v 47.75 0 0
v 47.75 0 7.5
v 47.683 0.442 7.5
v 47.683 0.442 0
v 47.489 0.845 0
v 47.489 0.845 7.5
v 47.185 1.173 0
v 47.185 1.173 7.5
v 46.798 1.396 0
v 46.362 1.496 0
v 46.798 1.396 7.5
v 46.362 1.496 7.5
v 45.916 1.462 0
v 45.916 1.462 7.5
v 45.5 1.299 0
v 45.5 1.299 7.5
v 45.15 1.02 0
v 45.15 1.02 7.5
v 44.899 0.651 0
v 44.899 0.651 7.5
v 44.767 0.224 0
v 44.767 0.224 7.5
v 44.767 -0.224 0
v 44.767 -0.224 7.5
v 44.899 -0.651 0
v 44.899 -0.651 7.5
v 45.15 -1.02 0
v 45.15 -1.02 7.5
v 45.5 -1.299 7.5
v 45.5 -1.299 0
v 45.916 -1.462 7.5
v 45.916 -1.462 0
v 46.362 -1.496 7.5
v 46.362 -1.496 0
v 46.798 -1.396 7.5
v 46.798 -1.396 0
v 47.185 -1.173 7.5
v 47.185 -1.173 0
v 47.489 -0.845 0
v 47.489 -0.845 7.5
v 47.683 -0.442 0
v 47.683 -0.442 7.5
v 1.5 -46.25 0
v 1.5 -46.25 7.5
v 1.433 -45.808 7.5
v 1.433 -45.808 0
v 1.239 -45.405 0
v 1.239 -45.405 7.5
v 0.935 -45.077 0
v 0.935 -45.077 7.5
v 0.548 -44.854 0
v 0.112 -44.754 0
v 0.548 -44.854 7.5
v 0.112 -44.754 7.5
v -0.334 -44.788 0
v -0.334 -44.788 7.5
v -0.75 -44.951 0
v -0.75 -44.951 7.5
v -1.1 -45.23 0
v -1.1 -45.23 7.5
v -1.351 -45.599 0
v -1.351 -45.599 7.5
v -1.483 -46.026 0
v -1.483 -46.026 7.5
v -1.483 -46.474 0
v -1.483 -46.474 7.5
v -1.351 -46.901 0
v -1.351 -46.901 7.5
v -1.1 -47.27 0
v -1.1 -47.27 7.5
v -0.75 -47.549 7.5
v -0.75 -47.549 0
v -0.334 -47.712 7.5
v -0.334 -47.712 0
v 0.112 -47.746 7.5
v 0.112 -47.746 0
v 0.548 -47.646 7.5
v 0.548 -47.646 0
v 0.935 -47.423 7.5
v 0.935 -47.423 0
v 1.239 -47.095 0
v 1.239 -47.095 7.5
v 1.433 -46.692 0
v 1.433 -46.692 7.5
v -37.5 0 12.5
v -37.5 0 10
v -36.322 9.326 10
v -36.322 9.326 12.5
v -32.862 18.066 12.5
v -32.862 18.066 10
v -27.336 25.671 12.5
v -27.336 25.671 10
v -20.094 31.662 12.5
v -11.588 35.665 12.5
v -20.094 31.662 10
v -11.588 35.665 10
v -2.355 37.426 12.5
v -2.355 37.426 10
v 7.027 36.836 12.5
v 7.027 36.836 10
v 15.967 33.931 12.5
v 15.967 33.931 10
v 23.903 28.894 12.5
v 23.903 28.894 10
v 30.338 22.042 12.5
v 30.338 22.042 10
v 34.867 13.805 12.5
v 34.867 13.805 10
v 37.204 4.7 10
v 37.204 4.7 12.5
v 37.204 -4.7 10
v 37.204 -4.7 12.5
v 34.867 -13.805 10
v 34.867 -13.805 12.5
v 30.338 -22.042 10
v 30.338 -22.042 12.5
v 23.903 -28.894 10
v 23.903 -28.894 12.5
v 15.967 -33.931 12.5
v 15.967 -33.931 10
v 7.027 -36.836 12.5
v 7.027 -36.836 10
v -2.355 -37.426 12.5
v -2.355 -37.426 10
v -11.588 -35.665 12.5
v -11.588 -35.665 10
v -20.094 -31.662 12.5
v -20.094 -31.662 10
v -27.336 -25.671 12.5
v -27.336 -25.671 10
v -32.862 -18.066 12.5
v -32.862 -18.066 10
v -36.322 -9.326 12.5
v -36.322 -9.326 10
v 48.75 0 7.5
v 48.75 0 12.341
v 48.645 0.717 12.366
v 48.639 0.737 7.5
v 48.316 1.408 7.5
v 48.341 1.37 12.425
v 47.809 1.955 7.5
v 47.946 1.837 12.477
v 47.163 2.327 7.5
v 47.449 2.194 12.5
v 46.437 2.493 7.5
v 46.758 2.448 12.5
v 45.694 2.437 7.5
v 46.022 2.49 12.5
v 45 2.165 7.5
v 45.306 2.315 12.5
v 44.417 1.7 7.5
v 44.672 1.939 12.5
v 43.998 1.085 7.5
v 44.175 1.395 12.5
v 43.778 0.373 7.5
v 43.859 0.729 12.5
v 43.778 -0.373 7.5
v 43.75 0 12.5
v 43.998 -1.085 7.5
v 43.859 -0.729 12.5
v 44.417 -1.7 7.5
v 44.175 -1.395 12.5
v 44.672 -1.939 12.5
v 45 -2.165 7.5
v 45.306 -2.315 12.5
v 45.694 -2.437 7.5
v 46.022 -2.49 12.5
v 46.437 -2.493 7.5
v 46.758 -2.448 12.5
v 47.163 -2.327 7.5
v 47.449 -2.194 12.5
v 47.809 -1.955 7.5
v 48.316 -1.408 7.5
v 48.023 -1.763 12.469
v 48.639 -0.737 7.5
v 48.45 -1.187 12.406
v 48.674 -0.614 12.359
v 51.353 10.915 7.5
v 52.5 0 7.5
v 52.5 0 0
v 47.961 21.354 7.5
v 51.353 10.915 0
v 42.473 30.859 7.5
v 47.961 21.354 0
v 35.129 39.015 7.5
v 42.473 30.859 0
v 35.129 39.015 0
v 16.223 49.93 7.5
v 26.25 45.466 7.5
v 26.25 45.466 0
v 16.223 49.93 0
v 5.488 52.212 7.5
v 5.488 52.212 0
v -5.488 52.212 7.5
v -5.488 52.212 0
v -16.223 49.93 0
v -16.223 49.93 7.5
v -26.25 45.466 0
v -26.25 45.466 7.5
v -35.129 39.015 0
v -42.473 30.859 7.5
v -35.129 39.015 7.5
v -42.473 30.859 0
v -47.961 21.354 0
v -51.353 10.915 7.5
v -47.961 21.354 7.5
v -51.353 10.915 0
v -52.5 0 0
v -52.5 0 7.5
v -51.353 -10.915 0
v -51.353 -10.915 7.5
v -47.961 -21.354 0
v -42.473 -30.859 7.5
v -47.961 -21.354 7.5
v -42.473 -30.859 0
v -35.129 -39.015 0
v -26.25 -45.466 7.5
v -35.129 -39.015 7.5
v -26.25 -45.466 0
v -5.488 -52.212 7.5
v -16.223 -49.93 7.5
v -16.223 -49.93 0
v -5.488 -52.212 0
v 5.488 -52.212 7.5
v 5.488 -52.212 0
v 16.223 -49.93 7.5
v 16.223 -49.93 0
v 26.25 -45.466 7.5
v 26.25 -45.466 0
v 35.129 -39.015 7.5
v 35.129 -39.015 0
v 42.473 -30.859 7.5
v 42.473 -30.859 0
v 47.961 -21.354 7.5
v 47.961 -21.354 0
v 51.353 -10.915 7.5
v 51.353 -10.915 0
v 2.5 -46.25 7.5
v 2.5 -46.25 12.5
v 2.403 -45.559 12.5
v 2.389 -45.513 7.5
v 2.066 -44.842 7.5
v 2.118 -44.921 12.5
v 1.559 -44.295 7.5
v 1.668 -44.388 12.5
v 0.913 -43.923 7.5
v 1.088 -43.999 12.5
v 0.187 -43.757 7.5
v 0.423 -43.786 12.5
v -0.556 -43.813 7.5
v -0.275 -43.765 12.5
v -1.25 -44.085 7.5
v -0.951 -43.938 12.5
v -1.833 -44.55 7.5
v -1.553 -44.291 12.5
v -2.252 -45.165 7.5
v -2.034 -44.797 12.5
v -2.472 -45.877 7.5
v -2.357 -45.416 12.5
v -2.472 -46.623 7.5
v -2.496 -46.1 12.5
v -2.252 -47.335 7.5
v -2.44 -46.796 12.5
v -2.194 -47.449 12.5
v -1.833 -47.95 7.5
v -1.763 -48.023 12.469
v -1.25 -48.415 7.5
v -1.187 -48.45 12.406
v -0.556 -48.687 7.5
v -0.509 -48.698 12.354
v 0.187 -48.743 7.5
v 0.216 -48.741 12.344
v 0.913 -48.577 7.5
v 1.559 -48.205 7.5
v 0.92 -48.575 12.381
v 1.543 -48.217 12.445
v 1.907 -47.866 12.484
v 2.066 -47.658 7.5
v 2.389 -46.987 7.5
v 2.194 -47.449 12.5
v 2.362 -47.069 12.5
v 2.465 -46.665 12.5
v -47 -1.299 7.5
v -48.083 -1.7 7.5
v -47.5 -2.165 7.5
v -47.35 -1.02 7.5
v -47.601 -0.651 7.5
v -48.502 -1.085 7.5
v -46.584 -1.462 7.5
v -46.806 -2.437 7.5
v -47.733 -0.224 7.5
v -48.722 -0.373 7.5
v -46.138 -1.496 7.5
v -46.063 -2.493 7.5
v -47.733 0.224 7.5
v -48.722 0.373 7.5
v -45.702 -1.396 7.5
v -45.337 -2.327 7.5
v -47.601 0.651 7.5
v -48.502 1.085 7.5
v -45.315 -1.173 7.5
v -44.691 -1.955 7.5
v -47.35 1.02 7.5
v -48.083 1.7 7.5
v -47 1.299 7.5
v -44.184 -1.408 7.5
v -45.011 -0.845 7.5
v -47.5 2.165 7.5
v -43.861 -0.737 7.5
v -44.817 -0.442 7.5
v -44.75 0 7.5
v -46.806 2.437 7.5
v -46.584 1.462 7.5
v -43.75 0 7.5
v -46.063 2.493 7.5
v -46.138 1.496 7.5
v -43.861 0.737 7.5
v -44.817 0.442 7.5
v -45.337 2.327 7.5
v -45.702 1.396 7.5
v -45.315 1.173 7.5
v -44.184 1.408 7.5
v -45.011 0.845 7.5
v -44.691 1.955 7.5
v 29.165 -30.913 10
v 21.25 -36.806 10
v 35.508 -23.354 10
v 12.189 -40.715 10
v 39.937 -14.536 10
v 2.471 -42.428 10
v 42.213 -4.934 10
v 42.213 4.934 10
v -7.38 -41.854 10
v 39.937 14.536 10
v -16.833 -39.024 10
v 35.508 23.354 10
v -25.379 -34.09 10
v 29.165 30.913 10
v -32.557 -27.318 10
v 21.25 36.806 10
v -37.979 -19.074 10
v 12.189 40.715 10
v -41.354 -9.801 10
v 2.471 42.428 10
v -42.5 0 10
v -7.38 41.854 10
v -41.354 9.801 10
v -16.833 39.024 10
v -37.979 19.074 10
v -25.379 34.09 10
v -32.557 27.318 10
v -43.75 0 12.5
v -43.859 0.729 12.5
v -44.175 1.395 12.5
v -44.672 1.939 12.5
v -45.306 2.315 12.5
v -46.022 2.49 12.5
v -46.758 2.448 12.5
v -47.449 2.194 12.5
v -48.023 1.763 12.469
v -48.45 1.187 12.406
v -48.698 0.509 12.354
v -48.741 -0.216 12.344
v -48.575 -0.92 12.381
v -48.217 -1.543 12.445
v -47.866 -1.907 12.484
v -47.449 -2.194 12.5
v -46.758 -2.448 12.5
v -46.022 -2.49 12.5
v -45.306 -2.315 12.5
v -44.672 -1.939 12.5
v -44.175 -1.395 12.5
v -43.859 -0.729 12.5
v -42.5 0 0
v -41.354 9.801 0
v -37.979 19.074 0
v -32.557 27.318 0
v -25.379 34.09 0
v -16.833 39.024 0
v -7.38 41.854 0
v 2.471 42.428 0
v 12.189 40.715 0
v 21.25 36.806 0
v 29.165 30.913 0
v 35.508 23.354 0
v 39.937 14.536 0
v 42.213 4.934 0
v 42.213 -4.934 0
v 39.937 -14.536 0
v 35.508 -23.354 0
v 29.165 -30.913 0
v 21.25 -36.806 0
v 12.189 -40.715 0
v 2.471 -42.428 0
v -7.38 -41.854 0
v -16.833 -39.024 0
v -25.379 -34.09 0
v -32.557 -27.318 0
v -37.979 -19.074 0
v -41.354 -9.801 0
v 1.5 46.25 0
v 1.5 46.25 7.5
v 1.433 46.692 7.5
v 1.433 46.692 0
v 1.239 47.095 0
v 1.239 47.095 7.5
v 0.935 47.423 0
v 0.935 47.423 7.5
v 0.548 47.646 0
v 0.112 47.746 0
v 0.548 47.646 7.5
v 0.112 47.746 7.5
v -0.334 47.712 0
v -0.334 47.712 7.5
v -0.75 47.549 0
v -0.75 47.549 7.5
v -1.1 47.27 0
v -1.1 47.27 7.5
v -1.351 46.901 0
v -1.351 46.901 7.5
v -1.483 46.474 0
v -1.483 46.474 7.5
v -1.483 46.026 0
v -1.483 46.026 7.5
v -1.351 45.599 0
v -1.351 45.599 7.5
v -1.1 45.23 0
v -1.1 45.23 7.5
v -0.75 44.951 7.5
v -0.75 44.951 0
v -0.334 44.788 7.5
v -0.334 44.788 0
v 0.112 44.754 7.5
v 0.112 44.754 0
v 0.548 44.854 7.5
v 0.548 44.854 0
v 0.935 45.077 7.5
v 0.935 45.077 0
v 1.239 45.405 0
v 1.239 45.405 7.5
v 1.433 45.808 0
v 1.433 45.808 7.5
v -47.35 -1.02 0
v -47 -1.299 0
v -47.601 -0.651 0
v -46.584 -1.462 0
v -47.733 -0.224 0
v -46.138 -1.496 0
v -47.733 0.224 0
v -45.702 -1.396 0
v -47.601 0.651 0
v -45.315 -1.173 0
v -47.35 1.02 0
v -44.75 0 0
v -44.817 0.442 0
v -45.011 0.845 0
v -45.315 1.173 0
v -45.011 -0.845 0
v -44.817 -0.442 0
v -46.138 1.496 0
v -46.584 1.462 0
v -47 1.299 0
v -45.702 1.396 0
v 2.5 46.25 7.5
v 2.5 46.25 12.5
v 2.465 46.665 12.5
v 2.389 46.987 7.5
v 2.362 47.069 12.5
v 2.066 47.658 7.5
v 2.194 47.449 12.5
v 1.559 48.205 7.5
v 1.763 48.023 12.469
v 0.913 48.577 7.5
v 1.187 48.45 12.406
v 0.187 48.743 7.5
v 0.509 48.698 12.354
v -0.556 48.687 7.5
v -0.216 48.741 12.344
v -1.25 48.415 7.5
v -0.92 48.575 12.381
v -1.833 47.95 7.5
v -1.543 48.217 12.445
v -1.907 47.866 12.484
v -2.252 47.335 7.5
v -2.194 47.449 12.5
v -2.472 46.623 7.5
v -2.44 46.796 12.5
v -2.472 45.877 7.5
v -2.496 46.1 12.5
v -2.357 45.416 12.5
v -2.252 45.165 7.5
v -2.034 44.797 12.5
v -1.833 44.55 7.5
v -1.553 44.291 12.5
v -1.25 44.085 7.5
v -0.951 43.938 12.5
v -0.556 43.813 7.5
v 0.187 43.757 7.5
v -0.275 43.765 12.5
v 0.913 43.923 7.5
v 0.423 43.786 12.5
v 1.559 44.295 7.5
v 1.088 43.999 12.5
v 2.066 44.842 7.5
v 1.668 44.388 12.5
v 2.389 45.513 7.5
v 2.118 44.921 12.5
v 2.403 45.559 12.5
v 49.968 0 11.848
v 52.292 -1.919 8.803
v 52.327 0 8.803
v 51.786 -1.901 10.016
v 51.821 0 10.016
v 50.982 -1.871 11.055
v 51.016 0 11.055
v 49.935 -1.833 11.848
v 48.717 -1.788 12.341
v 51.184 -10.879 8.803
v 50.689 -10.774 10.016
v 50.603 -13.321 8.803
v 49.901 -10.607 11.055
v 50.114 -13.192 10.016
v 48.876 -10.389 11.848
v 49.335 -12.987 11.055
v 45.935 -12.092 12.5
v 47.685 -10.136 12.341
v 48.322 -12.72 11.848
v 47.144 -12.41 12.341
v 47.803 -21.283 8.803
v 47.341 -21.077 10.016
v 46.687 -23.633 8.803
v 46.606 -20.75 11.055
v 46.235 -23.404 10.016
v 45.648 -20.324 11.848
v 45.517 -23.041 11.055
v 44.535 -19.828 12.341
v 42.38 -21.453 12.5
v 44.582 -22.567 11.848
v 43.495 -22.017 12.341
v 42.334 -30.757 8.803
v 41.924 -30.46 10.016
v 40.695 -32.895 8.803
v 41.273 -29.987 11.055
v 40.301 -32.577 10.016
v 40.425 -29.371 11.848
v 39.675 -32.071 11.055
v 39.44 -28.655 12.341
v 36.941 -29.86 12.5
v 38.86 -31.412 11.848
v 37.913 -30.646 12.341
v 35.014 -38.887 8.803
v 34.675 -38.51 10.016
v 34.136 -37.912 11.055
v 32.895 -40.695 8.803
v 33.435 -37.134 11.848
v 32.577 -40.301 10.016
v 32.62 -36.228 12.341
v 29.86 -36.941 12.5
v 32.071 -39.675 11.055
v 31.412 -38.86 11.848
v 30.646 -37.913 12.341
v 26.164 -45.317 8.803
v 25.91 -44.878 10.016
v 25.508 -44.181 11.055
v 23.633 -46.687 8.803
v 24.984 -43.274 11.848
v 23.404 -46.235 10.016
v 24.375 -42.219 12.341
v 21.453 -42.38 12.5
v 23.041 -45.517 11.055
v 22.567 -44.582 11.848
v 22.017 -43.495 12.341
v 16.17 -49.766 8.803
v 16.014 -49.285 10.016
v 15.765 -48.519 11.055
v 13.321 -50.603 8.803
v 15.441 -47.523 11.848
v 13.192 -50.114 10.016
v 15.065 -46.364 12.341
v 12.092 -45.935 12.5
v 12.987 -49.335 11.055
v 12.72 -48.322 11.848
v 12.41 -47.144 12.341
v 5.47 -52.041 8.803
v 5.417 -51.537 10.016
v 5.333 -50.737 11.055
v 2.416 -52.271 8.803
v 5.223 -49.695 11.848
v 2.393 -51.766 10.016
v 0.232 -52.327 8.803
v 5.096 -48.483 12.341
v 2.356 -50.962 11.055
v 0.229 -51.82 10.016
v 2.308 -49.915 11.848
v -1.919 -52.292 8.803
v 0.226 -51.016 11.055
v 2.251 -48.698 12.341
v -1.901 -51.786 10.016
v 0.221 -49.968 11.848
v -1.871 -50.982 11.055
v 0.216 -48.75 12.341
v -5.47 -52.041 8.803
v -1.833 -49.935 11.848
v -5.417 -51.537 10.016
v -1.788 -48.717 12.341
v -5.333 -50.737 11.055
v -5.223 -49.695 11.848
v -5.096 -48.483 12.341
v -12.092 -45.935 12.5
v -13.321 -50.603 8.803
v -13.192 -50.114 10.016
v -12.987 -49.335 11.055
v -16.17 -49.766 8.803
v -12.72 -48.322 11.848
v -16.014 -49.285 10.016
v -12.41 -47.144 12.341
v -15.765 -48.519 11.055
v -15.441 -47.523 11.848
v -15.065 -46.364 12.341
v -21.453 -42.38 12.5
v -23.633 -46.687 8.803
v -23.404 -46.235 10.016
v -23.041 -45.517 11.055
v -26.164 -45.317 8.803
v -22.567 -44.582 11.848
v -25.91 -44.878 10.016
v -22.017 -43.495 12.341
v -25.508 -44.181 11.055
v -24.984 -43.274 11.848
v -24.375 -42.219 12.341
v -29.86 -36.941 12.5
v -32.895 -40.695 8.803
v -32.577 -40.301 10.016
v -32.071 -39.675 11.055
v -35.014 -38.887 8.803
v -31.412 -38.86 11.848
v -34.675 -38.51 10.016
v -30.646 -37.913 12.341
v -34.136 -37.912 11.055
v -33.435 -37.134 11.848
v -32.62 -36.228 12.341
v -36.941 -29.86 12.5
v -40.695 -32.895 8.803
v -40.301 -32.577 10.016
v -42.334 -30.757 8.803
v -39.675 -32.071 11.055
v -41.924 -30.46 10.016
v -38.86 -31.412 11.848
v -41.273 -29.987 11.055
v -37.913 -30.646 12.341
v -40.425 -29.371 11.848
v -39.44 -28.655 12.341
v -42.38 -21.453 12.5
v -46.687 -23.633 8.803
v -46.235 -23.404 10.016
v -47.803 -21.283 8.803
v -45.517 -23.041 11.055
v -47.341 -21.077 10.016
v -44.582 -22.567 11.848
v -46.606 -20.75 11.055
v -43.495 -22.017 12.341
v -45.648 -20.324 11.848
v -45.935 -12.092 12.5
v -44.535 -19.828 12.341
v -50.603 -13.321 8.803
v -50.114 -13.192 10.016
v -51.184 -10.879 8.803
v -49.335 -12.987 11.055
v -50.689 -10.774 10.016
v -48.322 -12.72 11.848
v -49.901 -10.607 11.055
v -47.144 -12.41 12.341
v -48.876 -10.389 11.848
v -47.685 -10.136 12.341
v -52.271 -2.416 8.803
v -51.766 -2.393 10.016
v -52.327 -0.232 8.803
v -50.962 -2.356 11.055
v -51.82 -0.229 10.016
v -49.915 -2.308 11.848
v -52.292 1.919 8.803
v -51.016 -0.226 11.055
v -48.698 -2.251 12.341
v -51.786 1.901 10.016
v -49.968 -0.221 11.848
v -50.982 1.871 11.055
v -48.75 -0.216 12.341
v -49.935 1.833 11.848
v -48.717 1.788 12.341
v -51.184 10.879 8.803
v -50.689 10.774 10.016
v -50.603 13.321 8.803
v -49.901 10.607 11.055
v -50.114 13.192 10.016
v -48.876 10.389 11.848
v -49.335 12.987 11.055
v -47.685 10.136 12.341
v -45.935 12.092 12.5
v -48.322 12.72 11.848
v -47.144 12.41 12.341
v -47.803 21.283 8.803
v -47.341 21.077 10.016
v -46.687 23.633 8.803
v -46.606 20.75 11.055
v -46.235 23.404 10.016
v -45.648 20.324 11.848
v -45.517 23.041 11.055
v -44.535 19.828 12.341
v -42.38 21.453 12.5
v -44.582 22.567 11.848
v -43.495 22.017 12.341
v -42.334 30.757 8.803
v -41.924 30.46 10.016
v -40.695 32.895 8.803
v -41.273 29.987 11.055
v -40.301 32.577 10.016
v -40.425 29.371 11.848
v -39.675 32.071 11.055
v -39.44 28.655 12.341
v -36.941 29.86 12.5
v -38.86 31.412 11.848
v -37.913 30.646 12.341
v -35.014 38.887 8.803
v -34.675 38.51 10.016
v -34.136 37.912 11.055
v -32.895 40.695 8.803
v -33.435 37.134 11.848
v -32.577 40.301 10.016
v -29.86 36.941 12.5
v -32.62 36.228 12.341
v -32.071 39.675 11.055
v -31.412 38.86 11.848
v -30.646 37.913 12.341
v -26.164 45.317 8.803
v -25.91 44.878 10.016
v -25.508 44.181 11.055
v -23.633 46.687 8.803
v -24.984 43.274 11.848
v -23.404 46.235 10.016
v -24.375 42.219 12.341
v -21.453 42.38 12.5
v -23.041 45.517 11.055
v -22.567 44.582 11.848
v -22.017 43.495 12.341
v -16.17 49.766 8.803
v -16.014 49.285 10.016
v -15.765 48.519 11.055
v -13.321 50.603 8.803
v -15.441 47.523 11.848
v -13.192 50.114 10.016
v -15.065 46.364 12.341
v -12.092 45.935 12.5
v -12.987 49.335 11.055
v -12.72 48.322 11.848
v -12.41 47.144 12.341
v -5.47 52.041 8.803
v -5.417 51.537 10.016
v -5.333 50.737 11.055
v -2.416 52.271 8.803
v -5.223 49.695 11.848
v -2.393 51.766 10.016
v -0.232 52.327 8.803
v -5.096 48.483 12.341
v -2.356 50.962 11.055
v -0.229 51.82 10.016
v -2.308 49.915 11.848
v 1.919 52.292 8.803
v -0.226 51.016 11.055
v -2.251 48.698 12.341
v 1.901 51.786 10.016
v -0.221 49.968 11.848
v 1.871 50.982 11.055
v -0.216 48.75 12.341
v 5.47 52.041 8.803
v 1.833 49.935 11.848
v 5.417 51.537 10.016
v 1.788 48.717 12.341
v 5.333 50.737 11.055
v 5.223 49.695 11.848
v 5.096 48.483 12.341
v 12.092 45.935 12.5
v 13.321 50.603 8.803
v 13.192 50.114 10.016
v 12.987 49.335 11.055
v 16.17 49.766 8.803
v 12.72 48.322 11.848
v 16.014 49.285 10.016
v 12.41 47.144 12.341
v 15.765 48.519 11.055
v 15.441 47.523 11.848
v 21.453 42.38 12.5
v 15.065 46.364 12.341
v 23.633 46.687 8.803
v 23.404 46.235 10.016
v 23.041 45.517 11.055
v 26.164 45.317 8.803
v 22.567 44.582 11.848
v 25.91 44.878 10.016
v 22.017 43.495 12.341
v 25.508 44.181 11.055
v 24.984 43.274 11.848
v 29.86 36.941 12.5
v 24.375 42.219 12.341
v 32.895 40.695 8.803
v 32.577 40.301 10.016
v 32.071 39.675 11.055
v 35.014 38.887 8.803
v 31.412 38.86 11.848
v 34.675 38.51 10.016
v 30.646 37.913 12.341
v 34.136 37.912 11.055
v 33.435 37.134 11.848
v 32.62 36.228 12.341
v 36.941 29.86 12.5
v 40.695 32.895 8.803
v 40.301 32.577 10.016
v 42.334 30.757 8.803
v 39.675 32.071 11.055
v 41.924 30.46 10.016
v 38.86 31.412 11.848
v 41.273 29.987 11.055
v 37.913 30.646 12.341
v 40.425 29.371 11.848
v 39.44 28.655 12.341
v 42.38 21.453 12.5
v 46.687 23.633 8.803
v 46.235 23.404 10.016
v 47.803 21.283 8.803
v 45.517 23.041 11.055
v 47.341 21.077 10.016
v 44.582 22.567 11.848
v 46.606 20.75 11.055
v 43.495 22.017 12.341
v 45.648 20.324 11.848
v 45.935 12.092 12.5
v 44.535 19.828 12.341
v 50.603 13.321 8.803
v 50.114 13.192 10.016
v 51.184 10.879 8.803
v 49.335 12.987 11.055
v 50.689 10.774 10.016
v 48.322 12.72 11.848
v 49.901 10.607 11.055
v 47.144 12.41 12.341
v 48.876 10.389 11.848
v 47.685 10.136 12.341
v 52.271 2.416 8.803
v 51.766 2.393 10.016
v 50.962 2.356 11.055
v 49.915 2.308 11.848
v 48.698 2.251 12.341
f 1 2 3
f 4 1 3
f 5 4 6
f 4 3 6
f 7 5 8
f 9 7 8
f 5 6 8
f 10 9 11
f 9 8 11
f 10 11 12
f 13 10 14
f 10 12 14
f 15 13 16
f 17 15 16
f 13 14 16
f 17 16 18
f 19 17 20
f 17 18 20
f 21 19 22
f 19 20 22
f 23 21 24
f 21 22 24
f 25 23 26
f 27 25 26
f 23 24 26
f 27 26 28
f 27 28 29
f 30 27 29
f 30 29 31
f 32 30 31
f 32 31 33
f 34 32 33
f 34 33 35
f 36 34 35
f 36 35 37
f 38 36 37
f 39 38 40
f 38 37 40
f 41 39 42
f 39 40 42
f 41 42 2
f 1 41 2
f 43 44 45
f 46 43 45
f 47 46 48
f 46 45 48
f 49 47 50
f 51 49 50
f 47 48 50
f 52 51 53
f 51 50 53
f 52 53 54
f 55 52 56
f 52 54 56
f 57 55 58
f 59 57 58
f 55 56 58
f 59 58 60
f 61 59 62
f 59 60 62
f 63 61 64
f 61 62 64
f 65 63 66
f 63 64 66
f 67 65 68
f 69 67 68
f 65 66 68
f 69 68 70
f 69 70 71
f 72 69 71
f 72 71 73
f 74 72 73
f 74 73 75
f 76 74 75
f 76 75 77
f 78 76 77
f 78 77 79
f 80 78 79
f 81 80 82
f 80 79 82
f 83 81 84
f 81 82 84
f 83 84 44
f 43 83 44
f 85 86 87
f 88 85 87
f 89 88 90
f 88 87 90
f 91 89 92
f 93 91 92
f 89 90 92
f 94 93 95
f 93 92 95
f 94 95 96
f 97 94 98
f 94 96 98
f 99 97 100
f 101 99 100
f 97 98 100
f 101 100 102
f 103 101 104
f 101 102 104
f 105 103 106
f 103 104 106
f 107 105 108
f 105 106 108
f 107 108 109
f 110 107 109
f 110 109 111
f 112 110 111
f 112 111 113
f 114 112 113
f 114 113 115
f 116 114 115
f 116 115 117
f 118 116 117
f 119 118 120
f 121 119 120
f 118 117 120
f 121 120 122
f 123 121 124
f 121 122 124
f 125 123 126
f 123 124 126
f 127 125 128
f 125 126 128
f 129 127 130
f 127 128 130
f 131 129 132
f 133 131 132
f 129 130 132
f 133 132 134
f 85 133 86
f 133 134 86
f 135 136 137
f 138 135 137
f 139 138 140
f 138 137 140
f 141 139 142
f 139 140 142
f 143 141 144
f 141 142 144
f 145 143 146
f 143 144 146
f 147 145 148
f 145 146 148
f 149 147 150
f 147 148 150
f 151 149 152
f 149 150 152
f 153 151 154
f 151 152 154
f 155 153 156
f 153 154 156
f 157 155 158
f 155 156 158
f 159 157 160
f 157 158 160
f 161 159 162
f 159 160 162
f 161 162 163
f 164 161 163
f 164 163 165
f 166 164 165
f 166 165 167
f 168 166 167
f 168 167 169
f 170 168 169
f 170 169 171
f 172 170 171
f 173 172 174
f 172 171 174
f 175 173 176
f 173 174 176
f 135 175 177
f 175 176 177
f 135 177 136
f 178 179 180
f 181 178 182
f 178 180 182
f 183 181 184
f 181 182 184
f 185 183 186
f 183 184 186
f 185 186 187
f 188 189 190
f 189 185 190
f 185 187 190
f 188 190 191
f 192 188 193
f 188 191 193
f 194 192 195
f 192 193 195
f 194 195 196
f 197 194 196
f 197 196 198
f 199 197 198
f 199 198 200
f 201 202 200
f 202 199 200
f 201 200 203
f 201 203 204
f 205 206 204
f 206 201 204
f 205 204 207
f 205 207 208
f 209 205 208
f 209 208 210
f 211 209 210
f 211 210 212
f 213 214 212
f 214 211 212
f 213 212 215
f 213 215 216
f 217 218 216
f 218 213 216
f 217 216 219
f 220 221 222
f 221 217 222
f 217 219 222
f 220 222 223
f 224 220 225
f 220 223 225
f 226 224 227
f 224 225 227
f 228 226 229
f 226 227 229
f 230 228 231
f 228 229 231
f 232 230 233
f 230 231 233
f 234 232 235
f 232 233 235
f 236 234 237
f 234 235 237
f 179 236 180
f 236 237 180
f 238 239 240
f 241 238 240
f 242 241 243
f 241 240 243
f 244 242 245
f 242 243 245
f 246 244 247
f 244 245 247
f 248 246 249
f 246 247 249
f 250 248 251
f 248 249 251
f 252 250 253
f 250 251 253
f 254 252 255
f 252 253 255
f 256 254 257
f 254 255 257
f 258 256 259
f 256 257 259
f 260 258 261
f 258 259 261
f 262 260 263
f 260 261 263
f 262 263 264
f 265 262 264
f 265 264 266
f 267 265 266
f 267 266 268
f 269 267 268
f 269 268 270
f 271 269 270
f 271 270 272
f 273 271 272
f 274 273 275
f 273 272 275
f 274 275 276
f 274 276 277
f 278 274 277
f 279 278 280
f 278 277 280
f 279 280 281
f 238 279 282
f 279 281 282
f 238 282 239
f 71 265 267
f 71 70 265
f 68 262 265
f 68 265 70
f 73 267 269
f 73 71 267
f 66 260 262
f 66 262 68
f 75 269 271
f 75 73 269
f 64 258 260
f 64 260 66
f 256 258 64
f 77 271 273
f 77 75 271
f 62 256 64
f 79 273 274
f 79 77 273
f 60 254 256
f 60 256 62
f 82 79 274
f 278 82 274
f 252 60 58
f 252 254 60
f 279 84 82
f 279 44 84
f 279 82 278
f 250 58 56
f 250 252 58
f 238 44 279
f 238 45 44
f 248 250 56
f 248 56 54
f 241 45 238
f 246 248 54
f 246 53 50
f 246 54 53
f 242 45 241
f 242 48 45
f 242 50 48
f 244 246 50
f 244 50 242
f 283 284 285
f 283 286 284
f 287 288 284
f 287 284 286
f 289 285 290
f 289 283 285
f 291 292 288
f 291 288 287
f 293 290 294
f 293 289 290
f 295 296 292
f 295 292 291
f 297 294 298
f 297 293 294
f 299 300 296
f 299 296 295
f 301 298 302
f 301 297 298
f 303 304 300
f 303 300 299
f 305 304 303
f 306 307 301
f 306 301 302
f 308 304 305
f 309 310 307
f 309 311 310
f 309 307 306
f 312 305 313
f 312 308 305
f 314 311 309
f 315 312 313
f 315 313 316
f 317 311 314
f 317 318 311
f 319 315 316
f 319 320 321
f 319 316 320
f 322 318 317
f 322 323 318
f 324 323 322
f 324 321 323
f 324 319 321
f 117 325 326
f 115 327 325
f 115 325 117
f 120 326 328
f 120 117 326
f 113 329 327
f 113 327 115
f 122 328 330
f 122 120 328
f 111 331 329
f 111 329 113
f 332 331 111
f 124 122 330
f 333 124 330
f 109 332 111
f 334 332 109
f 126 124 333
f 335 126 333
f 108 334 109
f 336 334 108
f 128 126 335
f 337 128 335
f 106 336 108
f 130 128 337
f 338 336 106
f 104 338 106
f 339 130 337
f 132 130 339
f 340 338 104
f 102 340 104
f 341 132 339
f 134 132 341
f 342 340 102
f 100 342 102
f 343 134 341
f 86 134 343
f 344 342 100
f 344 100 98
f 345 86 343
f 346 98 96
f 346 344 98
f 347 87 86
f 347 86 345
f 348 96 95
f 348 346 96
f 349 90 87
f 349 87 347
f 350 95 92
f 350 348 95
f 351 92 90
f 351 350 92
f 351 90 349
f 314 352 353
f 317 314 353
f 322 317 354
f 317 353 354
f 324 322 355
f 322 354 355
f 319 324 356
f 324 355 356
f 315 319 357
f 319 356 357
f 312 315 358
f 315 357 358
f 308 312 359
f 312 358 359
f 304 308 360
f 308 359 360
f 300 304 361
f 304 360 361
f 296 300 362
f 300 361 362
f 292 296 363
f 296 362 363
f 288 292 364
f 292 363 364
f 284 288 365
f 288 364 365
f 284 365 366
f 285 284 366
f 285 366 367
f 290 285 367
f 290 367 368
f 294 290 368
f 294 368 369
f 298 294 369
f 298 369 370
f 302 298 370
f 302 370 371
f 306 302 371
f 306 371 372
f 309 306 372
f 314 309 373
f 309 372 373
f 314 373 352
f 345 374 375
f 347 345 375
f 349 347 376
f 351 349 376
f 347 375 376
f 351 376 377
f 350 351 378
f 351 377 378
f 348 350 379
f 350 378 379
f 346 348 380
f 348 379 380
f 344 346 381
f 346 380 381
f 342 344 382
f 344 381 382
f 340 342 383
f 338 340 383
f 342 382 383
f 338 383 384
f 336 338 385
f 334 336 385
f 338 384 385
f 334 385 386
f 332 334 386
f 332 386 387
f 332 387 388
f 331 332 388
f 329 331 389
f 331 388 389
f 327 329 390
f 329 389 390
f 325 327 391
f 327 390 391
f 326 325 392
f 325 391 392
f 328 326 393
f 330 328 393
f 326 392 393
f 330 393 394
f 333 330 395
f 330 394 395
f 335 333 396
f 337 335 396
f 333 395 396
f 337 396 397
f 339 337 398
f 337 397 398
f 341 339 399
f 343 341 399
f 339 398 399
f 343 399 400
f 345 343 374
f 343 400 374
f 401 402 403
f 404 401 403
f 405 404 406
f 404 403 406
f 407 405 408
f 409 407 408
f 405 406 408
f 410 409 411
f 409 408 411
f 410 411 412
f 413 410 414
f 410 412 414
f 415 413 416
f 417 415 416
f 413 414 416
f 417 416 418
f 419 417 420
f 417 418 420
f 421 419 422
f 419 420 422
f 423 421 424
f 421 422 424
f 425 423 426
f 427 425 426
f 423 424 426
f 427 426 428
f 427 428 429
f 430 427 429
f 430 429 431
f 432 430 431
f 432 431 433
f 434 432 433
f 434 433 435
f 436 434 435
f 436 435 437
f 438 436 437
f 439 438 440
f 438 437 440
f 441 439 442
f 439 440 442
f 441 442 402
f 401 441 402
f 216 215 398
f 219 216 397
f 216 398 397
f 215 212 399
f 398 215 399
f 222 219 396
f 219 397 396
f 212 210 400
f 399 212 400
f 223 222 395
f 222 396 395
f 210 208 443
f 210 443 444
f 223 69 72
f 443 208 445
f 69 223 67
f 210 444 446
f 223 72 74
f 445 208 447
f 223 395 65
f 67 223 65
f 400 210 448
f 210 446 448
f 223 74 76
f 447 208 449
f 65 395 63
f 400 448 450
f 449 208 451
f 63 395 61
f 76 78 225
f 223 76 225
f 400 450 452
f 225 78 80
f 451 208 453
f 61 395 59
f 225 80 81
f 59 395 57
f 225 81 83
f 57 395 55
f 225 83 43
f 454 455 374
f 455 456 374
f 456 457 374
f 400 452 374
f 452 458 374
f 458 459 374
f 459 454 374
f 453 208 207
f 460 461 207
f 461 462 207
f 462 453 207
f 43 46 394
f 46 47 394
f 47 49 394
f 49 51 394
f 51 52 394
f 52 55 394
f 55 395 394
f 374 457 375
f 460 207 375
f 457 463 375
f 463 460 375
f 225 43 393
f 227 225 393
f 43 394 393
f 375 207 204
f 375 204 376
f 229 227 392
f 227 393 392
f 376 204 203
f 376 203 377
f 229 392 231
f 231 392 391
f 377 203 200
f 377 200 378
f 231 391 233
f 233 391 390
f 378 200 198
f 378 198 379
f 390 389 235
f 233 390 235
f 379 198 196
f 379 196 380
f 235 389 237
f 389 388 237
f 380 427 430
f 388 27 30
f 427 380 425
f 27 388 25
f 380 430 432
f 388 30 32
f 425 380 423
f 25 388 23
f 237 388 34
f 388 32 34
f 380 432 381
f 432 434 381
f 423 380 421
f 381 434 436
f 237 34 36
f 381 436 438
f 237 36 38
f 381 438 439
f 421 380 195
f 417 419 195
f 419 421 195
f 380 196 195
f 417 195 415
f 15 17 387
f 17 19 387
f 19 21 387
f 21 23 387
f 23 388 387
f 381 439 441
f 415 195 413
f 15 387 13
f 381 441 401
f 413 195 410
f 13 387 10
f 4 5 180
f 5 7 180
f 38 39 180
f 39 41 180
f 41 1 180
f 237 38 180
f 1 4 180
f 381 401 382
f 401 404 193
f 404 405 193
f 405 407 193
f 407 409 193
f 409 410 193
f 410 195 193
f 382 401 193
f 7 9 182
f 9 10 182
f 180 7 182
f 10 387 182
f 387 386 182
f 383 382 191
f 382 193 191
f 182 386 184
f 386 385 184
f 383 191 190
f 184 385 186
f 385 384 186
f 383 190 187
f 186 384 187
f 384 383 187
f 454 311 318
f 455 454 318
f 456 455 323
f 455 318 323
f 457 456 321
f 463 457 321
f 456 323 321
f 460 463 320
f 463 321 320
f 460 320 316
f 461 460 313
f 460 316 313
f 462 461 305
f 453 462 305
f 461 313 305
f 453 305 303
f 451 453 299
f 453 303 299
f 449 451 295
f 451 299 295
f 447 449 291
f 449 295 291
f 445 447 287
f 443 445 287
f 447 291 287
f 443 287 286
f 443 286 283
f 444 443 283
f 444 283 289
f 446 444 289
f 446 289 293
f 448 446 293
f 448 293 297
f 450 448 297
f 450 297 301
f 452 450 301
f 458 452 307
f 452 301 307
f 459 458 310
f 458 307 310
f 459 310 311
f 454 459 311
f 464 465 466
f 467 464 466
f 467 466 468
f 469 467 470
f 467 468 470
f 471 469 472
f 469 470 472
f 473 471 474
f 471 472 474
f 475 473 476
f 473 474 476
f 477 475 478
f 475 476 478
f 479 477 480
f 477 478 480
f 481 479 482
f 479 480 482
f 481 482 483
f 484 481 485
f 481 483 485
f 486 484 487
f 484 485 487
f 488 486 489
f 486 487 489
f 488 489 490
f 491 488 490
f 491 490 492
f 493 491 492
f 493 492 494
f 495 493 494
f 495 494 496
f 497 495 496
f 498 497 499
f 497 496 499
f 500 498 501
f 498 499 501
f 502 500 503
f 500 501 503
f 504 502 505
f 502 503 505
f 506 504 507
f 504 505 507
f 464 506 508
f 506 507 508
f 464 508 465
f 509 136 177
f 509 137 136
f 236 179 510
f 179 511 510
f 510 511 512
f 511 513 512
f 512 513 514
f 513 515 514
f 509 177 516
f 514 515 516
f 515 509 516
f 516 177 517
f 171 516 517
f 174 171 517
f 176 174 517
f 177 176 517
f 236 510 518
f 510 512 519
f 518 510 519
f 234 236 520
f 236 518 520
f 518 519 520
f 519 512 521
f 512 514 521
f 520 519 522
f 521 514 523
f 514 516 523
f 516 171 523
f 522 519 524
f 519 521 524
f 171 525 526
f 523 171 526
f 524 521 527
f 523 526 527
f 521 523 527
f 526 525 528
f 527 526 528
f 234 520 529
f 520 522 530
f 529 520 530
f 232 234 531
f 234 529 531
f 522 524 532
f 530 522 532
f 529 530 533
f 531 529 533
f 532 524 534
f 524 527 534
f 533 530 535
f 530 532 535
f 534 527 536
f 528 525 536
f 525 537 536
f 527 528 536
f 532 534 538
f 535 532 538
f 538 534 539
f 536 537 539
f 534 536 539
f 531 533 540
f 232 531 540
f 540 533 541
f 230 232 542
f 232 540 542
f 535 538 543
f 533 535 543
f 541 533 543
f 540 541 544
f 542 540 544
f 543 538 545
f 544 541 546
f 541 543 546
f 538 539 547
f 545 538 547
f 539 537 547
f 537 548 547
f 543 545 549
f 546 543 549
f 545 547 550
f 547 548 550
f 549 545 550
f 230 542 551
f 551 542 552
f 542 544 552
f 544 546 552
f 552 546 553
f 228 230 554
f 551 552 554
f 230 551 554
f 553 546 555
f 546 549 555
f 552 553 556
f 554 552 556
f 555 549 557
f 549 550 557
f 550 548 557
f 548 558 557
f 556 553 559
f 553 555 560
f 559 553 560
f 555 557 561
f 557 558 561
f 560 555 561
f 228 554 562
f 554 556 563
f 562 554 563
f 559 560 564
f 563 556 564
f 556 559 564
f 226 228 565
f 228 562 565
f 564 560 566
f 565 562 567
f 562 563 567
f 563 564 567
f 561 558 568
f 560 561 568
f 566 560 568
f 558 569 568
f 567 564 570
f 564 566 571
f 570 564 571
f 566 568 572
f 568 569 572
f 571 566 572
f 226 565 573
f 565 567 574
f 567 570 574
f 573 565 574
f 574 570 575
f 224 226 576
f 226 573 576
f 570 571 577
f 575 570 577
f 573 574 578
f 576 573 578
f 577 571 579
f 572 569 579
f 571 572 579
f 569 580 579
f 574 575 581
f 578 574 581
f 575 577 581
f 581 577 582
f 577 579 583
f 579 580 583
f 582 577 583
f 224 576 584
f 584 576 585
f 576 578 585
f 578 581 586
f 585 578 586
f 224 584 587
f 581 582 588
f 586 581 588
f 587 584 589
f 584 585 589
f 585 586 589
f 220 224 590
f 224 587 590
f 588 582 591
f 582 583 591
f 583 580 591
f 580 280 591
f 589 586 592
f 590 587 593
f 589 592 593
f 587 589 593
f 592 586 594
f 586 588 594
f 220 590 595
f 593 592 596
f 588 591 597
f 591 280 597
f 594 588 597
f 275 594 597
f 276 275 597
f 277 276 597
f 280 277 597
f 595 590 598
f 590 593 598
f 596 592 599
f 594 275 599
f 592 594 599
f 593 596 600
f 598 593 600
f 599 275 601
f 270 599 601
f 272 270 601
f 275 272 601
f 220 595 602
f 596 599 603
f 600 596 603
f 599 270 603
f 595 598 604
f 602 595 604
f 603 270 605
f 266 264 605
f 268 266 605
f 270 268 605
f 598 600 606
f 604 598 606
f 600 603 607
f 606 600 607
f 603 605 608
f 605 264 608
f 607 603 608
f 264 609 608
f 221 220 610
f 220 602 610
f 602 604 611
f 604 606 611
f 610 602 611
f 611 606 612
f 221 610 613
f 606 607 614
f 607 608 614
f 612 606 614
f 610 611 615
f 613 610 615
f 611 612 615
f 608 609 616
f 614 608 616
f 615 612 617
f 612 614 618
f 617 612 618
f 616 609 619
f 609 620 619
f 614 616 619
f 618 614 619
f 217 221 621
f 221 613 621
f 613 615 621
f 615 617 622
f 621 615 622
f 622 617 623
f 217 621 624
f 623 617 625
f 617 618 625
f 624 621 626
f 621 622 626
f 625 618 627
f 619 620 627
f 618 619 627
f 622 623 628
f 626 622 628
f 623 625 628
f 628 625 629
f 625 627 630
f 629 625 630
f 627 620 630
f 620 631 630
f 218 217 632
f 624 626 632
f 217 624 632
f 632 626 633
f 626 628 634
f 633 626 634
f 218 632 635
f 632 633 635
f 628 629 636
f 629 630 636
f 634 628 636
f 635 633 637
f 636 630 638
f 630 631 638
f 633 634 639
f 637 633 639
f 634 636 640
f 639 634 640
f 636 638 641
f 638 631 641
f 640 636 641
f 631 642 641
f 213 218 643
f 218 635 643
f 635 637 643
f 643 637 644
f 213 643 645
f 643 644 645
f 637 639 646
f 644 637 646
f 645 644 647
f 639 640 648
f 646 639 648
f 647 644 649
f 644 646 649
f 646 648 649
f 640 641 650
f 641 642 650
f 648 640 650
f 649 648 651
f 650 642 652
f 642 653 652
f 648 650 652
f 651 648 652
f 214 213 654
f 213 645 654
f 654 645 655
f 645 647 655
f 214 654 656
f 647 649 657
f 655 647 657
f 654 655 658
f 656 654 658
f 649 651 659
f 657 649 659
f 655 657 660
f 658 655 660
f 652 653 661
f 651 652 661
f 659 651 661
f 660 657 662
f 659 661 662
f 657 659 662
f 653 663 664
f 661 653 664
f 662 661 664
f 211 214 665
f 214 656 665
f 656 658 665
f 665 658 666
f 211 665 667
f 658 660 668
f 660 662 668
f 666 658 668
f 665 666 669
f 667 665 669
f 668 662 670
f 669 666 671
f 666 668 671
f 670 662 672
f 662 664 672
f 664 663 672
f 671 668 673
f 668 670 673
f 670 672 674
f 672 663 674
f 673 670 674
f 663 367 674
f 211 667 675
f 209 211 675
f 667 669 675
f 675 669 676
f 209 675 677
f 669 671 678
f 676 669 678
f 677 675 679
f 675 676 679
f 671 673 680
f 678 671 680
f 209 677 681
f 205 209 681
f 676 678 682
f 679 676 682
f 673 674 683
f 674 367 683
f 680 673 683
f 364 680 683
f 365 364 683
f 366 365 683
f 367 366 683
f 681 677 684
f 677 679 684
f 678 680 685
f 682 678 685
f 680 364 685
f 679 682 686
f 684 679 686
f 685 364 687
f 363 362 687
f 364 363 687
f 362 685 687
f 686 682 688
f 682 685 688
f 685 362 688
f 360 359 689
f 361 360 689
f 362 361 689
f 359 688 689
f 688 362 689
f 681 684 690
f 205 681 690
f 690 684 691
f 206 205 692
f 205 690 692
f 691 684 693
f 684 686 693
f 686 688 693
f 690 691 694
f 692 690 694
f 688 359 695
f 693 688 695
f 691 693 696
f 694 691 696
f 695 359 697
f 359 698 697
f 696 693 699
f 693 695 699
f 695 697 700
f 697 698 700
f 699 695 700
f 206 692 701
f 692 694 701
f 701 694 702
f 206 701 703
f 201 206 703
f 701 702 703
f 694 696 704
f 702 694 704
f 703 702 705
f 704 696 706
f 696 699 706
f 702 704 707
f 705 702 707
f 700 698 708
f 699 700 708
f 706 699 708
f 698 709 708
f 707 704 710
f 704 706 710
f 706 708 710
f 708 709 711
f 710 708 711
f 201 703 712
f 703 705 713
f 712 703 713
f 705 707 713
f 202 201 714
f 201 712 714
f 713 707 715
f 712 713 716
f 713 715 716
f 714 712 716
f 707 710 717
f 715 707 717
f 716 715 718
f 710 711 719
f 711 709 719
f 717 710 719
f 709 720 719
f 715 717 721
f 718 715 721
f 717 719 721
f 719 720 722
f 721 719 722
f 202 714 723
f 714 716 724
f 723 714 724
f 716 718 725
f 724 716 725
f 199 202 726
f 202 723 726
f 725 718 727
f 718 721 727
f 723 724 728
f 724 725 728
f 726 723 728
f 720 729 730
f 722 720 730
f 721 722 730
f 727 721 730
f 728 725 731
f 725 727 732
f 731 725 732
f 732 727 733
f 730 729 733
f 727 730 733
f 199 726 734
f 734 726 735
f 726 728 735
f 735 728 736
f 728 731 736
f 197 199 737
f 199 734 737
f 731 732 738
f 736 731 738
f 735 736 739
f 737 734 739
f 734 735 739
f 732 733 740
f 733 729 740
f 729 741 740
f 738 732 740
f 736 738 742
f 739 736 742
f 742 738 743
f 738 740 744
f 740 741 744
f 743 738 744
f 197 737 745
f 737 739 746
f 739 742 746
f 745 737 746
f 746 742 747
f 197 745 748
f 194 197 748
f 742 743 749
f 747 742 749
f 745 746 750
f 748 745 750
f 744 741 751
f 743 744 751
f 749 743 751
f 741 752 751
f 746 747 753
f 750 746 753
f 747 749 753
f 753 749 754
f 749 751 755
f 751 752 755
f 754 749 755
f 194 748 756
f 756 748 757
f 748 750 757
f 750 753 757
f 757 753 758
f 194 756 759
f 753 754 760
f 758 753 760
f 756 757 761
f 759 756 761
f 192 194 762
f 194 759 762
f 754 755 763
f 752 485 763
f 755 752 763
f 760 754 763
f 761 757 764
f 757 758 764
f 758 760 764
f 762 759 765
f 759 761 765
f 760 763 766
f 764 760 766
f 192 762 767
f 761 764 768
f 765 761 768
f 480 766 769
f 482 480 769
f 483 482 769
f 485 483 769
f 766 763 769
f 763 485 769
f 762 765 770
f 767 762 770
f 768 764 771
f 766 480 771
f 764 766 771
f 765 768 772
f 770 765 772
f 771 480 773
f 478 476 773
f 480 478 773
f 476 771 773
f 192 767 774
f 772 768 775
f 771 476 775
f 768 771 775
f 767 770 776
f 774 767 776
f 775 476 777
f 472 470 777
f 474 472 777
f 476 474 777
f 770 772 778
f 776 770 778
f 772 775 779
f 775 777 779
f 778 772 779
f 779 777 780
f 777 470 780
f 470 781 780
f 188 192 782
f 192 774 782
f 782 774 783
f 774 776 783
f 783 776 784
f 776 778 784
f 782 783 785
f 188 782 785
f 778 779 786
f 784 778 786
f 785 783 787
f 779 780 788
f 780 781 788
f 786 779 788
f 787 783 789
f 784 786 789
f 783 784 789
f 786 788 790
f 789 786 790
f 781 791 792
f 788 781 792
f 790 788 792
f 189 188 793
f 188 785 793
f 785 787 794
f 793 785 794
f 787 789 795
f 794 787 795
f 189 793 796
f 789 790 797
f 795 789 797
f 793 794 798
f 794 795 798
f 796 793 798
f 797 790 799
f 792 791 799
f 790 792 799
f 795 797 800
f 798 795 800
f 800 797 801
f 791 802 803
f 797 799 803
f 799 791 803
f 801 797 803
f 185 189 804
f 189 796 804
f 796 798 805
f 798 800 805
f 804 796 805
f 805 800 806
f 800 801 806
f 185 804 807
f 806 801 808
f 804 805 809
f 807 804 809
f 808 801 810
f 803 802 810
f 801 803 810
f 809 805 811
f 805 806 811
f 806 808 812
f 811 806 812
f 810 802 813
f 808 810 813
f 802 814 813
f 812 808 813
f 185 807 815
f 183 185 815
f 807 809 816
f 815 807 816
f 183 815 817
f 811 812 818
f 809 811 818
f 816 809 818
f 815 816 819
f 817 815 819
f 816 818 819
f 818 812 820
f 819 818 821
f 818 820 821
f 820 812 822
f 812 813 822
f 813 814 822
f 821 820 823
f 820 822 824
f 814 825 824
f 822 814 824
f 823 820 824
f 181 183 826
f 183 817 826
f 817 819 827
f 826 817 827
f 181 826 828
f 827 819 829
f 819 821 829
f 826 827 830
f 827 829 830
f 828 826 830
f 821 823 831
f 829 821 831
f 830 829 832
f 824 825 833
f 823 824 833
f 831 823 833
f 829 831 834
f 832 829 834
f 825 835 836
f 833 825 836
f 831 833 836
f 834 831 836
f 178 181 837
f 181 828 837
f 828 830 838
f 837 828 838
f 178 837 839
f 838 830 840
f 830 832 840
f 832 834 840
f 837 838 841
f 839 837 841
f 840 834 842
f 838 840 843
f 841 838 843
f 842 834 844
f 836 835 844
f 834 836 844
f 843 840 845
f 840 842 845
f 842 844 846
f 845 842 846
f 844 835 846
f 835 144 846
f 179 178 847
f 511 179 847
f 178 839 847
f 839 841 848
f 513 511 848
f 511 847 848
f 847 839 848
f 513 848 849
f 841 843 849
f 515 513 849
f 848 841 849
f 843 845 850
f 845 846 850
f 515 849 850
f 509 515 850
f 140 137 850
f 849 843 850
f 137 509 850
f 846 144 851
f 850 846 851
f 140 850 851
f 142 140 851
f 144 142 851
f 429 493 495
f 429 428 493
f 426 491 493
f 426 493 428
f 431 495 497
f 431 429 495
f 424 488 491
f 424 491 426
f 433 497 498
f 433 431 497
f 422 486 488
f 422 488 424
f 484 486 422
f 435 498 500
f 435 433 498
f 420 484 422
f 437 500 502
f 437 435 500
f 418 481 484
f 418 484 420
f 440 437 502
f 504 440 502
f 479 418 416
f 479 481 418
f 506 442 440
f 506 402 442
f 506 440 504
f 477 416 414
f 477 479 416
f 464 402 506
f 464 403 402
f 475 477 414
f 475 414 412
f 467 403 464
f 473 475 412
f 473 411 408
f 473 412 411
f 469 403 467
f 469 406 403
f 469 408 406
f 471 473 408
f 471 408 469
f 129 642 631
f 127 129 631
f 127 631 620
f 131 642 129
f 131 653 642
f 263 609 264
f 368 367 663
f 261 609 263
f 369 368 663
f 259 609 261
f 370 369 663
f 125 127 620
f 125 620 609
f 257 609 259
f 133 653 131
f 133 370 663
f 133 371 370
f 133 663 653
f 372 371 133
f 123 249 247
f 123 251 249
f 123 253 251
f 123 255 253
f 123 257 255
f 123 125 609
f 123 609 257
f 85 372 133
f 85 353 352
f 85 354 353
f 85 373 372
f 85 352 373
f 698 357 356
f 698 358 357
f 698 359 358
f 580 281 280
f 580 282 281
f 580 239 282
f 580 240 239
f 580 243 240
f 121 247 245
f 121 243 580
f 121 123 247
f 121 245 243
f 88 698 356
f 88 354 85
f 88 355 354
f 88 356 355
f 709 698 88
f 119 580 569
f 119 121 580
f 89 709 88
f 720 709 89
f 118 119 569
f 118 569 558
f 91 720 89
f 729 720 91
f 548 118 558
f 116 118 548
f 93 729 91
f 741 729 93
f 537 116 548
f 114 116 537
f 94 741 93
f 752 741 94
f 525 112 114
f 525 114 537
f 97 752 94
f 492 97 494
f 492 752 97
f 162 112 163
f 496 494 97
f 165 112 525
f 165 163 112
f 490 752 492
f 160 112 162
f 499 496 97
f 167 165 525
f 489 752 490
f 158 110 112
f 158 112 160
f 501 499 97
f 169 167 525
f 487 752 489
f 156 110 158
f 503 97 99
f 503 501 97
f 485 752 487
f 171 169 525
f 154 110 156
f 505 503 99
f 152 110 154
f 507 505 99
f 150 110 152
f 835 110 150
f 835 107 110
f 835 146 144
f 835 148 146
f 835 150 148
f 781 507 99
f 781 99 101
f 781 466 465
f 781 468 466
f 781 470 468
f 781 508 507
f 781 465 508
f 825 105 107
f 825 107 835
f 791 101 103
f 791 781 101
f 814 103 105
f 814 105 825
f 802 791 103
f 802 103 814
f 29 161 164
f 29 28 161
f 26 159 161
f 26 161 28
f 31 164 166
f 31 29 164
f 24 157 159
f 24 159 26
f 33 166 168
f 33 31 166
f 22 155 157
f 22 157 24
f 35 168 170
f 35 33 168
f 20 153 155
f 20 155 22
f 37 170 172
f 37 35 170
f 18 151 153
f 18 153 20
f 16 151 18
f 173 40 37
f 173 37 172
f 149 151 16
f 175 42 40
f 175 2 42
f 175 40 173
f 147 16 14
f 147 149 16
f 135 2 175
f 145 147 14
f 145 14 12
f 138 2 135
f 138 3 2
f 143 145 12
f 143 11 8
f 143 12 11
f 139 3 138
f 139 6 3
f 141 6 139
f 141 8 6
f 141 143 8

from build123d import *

# Parameters (mm, degrees)
SKETCH1_R           = 52.5
BOSS_EXTRUDE1_DEPTH = 20
SKETCH2_R           = 42.5
SKETCH2_R_2         = 40
CUT_EXTRUDE1_DEPTH  = 10
SKETCH4_R           = 40
CUT_EXTRUDE3_DEPTH  = 10
SKETCH8_R           = 55
CUT_EXTRUDE4_DEPTH  = 7.5
SKETCH9_R           = 37.5
CUT_EXTRUDE5_DEPTH  = 2.5
FILLET1_R           = 5
SKETCH10_R          = 2.5
CUT_EXTRUDE6_DEPTH  = 5
SKETCH11_R          = 1.5
CUT_EXTRUDE7_DEPTH  = 7.5
SKETCH13_R          = 1.5
CUT_EXTRUDE9_DEPTH  = 7.5
SKETCH14_R          = 1.5
CUT_EXTRUDE10_DEPTH = 7.5
SKETCH15_R          = 1.5
CUT_EXTRUDE11_DEPTH = 7.5


with BuildPart() as part:
    # Sketch1 → Boss-Extrude1 (new body)
    with BuildSketch(Plane.XY):
        Circle(SKETCH1_R)
    extrude(amount=BOSS_EXTRUDE1_DEPTH)

    # Sketch2 → Cut-Extrude1 (cut)
    with BuildSketch(Plane(origin=(0, 0, 0), x_dir=(-1, 0, 0), z_dir=(0, 0, -1))):
        Circle(SKETCH2_R)
        Circle(SKETCH2_R_2, mode=Mode.SUBTRACT)
    extrude(amount=-CUT_EXTRUDE1_DEPTH, mode=Mode.SUBTRACT)

    # Sketch4 → Cut-Extrude3 (cut)
    with BuildSketch(Plane(origin=(0, 0, 0), x_dir=(-1, 0, 0), z_dir=(0, 0, -1))):
        Circle(SKETCH4_R)
    extrude(amount=-CUT_EXTRUDE3_DEPTH, mode=Mode.SUBTRACT)

    # Sketch8 → Cut-Extrude4 (cut)
    with BuildSketch(Plane.XY.offset(20)):
        Circle(SKETCH8_R)
    extrude(amount=-CUT_EXTRUDE4_DEPTH, mode=Mode.SUBTRACT)

    # Sketch9 → Cut-Extrude5 (cut)
    with BuildSketch(Plane(origin=(0, 0, 10), x_dir=(-1, 0, 0), z_dir=(0, 0, -1))):
        Circle(SKETCH9_R)
    extrude(amount=-CUT_EXTRUDE5_DEPTH, mode=Mode.SUBTRACT)

    # Fillet1
    fillet1_edges = [part.edges().sort_by_distance(p)[0] for p in [
        (-52.5, 0, 12.5),
    ]]
    fillet(fillet1_edges, radius=FILLET1_R)

    # Sketch10 → Cut-Extrude6 (cut)
    with BuildSketch(Plane.XY.offset(12.5)):
        with Locations((0, 46.25)):
            Circle(SKETCH10_R)
        with Locations((46.25, 0)):
            Circle(SKETCH10_R)
        with Locations((0, -46.25)):
            Circle(SKETCH10_R)
        with Locations((-46.25, 0)):
            Circle(SKETCH10_R)
    extrude(amount=-CUT_EXTRUDE6_DEPTH, mode=Mode.SUBTRACT)

    # Sketch11 → Cut-Extrude7 (cut)
    with BuildSketch(Plane.XY.offset(7.5)):
        with Locations((0, 46.25)):
            Circle(SKETCH11_R)
    extrude(amount=-CUT_EXTRUDE7_DEPTH, mode=Mode.SUBTRACT)

    # Sketch13 → Cut-Extrude9 (cut)
    with BuildSketch(Plane.XY.offset(7.5)):
        with Locations((0, -46.25)):
            Circle(SKETCH13_R)
    extrude(amount=-CUT_EXTRUDE9_DEPTH, mode=Mode.SUBTRACT)

    # Sketch14 → Cut-Extrude10 (cut)
    with BuildSketch(Plane.XY.offset(7.5)):
        with Locations((-46.25, 0)):
            Circle(SKETCH14_R)
    extrude(amount=-CUT_EXTRUDE10_DEPTH, mode=Mode.SUBTRACT)

    # Sketch15 → Cut-Extrude11 (cut)
    with BuildSketch(Plane.XY.offset(7.5)):
        with Locations((46.25, 0)):
            Circle(SKETCH15_R)
    extrude(amount=-CUT_EXTRUDE11_DEPTH, mode=Mode.SUBTRACT)


solid = part.part
